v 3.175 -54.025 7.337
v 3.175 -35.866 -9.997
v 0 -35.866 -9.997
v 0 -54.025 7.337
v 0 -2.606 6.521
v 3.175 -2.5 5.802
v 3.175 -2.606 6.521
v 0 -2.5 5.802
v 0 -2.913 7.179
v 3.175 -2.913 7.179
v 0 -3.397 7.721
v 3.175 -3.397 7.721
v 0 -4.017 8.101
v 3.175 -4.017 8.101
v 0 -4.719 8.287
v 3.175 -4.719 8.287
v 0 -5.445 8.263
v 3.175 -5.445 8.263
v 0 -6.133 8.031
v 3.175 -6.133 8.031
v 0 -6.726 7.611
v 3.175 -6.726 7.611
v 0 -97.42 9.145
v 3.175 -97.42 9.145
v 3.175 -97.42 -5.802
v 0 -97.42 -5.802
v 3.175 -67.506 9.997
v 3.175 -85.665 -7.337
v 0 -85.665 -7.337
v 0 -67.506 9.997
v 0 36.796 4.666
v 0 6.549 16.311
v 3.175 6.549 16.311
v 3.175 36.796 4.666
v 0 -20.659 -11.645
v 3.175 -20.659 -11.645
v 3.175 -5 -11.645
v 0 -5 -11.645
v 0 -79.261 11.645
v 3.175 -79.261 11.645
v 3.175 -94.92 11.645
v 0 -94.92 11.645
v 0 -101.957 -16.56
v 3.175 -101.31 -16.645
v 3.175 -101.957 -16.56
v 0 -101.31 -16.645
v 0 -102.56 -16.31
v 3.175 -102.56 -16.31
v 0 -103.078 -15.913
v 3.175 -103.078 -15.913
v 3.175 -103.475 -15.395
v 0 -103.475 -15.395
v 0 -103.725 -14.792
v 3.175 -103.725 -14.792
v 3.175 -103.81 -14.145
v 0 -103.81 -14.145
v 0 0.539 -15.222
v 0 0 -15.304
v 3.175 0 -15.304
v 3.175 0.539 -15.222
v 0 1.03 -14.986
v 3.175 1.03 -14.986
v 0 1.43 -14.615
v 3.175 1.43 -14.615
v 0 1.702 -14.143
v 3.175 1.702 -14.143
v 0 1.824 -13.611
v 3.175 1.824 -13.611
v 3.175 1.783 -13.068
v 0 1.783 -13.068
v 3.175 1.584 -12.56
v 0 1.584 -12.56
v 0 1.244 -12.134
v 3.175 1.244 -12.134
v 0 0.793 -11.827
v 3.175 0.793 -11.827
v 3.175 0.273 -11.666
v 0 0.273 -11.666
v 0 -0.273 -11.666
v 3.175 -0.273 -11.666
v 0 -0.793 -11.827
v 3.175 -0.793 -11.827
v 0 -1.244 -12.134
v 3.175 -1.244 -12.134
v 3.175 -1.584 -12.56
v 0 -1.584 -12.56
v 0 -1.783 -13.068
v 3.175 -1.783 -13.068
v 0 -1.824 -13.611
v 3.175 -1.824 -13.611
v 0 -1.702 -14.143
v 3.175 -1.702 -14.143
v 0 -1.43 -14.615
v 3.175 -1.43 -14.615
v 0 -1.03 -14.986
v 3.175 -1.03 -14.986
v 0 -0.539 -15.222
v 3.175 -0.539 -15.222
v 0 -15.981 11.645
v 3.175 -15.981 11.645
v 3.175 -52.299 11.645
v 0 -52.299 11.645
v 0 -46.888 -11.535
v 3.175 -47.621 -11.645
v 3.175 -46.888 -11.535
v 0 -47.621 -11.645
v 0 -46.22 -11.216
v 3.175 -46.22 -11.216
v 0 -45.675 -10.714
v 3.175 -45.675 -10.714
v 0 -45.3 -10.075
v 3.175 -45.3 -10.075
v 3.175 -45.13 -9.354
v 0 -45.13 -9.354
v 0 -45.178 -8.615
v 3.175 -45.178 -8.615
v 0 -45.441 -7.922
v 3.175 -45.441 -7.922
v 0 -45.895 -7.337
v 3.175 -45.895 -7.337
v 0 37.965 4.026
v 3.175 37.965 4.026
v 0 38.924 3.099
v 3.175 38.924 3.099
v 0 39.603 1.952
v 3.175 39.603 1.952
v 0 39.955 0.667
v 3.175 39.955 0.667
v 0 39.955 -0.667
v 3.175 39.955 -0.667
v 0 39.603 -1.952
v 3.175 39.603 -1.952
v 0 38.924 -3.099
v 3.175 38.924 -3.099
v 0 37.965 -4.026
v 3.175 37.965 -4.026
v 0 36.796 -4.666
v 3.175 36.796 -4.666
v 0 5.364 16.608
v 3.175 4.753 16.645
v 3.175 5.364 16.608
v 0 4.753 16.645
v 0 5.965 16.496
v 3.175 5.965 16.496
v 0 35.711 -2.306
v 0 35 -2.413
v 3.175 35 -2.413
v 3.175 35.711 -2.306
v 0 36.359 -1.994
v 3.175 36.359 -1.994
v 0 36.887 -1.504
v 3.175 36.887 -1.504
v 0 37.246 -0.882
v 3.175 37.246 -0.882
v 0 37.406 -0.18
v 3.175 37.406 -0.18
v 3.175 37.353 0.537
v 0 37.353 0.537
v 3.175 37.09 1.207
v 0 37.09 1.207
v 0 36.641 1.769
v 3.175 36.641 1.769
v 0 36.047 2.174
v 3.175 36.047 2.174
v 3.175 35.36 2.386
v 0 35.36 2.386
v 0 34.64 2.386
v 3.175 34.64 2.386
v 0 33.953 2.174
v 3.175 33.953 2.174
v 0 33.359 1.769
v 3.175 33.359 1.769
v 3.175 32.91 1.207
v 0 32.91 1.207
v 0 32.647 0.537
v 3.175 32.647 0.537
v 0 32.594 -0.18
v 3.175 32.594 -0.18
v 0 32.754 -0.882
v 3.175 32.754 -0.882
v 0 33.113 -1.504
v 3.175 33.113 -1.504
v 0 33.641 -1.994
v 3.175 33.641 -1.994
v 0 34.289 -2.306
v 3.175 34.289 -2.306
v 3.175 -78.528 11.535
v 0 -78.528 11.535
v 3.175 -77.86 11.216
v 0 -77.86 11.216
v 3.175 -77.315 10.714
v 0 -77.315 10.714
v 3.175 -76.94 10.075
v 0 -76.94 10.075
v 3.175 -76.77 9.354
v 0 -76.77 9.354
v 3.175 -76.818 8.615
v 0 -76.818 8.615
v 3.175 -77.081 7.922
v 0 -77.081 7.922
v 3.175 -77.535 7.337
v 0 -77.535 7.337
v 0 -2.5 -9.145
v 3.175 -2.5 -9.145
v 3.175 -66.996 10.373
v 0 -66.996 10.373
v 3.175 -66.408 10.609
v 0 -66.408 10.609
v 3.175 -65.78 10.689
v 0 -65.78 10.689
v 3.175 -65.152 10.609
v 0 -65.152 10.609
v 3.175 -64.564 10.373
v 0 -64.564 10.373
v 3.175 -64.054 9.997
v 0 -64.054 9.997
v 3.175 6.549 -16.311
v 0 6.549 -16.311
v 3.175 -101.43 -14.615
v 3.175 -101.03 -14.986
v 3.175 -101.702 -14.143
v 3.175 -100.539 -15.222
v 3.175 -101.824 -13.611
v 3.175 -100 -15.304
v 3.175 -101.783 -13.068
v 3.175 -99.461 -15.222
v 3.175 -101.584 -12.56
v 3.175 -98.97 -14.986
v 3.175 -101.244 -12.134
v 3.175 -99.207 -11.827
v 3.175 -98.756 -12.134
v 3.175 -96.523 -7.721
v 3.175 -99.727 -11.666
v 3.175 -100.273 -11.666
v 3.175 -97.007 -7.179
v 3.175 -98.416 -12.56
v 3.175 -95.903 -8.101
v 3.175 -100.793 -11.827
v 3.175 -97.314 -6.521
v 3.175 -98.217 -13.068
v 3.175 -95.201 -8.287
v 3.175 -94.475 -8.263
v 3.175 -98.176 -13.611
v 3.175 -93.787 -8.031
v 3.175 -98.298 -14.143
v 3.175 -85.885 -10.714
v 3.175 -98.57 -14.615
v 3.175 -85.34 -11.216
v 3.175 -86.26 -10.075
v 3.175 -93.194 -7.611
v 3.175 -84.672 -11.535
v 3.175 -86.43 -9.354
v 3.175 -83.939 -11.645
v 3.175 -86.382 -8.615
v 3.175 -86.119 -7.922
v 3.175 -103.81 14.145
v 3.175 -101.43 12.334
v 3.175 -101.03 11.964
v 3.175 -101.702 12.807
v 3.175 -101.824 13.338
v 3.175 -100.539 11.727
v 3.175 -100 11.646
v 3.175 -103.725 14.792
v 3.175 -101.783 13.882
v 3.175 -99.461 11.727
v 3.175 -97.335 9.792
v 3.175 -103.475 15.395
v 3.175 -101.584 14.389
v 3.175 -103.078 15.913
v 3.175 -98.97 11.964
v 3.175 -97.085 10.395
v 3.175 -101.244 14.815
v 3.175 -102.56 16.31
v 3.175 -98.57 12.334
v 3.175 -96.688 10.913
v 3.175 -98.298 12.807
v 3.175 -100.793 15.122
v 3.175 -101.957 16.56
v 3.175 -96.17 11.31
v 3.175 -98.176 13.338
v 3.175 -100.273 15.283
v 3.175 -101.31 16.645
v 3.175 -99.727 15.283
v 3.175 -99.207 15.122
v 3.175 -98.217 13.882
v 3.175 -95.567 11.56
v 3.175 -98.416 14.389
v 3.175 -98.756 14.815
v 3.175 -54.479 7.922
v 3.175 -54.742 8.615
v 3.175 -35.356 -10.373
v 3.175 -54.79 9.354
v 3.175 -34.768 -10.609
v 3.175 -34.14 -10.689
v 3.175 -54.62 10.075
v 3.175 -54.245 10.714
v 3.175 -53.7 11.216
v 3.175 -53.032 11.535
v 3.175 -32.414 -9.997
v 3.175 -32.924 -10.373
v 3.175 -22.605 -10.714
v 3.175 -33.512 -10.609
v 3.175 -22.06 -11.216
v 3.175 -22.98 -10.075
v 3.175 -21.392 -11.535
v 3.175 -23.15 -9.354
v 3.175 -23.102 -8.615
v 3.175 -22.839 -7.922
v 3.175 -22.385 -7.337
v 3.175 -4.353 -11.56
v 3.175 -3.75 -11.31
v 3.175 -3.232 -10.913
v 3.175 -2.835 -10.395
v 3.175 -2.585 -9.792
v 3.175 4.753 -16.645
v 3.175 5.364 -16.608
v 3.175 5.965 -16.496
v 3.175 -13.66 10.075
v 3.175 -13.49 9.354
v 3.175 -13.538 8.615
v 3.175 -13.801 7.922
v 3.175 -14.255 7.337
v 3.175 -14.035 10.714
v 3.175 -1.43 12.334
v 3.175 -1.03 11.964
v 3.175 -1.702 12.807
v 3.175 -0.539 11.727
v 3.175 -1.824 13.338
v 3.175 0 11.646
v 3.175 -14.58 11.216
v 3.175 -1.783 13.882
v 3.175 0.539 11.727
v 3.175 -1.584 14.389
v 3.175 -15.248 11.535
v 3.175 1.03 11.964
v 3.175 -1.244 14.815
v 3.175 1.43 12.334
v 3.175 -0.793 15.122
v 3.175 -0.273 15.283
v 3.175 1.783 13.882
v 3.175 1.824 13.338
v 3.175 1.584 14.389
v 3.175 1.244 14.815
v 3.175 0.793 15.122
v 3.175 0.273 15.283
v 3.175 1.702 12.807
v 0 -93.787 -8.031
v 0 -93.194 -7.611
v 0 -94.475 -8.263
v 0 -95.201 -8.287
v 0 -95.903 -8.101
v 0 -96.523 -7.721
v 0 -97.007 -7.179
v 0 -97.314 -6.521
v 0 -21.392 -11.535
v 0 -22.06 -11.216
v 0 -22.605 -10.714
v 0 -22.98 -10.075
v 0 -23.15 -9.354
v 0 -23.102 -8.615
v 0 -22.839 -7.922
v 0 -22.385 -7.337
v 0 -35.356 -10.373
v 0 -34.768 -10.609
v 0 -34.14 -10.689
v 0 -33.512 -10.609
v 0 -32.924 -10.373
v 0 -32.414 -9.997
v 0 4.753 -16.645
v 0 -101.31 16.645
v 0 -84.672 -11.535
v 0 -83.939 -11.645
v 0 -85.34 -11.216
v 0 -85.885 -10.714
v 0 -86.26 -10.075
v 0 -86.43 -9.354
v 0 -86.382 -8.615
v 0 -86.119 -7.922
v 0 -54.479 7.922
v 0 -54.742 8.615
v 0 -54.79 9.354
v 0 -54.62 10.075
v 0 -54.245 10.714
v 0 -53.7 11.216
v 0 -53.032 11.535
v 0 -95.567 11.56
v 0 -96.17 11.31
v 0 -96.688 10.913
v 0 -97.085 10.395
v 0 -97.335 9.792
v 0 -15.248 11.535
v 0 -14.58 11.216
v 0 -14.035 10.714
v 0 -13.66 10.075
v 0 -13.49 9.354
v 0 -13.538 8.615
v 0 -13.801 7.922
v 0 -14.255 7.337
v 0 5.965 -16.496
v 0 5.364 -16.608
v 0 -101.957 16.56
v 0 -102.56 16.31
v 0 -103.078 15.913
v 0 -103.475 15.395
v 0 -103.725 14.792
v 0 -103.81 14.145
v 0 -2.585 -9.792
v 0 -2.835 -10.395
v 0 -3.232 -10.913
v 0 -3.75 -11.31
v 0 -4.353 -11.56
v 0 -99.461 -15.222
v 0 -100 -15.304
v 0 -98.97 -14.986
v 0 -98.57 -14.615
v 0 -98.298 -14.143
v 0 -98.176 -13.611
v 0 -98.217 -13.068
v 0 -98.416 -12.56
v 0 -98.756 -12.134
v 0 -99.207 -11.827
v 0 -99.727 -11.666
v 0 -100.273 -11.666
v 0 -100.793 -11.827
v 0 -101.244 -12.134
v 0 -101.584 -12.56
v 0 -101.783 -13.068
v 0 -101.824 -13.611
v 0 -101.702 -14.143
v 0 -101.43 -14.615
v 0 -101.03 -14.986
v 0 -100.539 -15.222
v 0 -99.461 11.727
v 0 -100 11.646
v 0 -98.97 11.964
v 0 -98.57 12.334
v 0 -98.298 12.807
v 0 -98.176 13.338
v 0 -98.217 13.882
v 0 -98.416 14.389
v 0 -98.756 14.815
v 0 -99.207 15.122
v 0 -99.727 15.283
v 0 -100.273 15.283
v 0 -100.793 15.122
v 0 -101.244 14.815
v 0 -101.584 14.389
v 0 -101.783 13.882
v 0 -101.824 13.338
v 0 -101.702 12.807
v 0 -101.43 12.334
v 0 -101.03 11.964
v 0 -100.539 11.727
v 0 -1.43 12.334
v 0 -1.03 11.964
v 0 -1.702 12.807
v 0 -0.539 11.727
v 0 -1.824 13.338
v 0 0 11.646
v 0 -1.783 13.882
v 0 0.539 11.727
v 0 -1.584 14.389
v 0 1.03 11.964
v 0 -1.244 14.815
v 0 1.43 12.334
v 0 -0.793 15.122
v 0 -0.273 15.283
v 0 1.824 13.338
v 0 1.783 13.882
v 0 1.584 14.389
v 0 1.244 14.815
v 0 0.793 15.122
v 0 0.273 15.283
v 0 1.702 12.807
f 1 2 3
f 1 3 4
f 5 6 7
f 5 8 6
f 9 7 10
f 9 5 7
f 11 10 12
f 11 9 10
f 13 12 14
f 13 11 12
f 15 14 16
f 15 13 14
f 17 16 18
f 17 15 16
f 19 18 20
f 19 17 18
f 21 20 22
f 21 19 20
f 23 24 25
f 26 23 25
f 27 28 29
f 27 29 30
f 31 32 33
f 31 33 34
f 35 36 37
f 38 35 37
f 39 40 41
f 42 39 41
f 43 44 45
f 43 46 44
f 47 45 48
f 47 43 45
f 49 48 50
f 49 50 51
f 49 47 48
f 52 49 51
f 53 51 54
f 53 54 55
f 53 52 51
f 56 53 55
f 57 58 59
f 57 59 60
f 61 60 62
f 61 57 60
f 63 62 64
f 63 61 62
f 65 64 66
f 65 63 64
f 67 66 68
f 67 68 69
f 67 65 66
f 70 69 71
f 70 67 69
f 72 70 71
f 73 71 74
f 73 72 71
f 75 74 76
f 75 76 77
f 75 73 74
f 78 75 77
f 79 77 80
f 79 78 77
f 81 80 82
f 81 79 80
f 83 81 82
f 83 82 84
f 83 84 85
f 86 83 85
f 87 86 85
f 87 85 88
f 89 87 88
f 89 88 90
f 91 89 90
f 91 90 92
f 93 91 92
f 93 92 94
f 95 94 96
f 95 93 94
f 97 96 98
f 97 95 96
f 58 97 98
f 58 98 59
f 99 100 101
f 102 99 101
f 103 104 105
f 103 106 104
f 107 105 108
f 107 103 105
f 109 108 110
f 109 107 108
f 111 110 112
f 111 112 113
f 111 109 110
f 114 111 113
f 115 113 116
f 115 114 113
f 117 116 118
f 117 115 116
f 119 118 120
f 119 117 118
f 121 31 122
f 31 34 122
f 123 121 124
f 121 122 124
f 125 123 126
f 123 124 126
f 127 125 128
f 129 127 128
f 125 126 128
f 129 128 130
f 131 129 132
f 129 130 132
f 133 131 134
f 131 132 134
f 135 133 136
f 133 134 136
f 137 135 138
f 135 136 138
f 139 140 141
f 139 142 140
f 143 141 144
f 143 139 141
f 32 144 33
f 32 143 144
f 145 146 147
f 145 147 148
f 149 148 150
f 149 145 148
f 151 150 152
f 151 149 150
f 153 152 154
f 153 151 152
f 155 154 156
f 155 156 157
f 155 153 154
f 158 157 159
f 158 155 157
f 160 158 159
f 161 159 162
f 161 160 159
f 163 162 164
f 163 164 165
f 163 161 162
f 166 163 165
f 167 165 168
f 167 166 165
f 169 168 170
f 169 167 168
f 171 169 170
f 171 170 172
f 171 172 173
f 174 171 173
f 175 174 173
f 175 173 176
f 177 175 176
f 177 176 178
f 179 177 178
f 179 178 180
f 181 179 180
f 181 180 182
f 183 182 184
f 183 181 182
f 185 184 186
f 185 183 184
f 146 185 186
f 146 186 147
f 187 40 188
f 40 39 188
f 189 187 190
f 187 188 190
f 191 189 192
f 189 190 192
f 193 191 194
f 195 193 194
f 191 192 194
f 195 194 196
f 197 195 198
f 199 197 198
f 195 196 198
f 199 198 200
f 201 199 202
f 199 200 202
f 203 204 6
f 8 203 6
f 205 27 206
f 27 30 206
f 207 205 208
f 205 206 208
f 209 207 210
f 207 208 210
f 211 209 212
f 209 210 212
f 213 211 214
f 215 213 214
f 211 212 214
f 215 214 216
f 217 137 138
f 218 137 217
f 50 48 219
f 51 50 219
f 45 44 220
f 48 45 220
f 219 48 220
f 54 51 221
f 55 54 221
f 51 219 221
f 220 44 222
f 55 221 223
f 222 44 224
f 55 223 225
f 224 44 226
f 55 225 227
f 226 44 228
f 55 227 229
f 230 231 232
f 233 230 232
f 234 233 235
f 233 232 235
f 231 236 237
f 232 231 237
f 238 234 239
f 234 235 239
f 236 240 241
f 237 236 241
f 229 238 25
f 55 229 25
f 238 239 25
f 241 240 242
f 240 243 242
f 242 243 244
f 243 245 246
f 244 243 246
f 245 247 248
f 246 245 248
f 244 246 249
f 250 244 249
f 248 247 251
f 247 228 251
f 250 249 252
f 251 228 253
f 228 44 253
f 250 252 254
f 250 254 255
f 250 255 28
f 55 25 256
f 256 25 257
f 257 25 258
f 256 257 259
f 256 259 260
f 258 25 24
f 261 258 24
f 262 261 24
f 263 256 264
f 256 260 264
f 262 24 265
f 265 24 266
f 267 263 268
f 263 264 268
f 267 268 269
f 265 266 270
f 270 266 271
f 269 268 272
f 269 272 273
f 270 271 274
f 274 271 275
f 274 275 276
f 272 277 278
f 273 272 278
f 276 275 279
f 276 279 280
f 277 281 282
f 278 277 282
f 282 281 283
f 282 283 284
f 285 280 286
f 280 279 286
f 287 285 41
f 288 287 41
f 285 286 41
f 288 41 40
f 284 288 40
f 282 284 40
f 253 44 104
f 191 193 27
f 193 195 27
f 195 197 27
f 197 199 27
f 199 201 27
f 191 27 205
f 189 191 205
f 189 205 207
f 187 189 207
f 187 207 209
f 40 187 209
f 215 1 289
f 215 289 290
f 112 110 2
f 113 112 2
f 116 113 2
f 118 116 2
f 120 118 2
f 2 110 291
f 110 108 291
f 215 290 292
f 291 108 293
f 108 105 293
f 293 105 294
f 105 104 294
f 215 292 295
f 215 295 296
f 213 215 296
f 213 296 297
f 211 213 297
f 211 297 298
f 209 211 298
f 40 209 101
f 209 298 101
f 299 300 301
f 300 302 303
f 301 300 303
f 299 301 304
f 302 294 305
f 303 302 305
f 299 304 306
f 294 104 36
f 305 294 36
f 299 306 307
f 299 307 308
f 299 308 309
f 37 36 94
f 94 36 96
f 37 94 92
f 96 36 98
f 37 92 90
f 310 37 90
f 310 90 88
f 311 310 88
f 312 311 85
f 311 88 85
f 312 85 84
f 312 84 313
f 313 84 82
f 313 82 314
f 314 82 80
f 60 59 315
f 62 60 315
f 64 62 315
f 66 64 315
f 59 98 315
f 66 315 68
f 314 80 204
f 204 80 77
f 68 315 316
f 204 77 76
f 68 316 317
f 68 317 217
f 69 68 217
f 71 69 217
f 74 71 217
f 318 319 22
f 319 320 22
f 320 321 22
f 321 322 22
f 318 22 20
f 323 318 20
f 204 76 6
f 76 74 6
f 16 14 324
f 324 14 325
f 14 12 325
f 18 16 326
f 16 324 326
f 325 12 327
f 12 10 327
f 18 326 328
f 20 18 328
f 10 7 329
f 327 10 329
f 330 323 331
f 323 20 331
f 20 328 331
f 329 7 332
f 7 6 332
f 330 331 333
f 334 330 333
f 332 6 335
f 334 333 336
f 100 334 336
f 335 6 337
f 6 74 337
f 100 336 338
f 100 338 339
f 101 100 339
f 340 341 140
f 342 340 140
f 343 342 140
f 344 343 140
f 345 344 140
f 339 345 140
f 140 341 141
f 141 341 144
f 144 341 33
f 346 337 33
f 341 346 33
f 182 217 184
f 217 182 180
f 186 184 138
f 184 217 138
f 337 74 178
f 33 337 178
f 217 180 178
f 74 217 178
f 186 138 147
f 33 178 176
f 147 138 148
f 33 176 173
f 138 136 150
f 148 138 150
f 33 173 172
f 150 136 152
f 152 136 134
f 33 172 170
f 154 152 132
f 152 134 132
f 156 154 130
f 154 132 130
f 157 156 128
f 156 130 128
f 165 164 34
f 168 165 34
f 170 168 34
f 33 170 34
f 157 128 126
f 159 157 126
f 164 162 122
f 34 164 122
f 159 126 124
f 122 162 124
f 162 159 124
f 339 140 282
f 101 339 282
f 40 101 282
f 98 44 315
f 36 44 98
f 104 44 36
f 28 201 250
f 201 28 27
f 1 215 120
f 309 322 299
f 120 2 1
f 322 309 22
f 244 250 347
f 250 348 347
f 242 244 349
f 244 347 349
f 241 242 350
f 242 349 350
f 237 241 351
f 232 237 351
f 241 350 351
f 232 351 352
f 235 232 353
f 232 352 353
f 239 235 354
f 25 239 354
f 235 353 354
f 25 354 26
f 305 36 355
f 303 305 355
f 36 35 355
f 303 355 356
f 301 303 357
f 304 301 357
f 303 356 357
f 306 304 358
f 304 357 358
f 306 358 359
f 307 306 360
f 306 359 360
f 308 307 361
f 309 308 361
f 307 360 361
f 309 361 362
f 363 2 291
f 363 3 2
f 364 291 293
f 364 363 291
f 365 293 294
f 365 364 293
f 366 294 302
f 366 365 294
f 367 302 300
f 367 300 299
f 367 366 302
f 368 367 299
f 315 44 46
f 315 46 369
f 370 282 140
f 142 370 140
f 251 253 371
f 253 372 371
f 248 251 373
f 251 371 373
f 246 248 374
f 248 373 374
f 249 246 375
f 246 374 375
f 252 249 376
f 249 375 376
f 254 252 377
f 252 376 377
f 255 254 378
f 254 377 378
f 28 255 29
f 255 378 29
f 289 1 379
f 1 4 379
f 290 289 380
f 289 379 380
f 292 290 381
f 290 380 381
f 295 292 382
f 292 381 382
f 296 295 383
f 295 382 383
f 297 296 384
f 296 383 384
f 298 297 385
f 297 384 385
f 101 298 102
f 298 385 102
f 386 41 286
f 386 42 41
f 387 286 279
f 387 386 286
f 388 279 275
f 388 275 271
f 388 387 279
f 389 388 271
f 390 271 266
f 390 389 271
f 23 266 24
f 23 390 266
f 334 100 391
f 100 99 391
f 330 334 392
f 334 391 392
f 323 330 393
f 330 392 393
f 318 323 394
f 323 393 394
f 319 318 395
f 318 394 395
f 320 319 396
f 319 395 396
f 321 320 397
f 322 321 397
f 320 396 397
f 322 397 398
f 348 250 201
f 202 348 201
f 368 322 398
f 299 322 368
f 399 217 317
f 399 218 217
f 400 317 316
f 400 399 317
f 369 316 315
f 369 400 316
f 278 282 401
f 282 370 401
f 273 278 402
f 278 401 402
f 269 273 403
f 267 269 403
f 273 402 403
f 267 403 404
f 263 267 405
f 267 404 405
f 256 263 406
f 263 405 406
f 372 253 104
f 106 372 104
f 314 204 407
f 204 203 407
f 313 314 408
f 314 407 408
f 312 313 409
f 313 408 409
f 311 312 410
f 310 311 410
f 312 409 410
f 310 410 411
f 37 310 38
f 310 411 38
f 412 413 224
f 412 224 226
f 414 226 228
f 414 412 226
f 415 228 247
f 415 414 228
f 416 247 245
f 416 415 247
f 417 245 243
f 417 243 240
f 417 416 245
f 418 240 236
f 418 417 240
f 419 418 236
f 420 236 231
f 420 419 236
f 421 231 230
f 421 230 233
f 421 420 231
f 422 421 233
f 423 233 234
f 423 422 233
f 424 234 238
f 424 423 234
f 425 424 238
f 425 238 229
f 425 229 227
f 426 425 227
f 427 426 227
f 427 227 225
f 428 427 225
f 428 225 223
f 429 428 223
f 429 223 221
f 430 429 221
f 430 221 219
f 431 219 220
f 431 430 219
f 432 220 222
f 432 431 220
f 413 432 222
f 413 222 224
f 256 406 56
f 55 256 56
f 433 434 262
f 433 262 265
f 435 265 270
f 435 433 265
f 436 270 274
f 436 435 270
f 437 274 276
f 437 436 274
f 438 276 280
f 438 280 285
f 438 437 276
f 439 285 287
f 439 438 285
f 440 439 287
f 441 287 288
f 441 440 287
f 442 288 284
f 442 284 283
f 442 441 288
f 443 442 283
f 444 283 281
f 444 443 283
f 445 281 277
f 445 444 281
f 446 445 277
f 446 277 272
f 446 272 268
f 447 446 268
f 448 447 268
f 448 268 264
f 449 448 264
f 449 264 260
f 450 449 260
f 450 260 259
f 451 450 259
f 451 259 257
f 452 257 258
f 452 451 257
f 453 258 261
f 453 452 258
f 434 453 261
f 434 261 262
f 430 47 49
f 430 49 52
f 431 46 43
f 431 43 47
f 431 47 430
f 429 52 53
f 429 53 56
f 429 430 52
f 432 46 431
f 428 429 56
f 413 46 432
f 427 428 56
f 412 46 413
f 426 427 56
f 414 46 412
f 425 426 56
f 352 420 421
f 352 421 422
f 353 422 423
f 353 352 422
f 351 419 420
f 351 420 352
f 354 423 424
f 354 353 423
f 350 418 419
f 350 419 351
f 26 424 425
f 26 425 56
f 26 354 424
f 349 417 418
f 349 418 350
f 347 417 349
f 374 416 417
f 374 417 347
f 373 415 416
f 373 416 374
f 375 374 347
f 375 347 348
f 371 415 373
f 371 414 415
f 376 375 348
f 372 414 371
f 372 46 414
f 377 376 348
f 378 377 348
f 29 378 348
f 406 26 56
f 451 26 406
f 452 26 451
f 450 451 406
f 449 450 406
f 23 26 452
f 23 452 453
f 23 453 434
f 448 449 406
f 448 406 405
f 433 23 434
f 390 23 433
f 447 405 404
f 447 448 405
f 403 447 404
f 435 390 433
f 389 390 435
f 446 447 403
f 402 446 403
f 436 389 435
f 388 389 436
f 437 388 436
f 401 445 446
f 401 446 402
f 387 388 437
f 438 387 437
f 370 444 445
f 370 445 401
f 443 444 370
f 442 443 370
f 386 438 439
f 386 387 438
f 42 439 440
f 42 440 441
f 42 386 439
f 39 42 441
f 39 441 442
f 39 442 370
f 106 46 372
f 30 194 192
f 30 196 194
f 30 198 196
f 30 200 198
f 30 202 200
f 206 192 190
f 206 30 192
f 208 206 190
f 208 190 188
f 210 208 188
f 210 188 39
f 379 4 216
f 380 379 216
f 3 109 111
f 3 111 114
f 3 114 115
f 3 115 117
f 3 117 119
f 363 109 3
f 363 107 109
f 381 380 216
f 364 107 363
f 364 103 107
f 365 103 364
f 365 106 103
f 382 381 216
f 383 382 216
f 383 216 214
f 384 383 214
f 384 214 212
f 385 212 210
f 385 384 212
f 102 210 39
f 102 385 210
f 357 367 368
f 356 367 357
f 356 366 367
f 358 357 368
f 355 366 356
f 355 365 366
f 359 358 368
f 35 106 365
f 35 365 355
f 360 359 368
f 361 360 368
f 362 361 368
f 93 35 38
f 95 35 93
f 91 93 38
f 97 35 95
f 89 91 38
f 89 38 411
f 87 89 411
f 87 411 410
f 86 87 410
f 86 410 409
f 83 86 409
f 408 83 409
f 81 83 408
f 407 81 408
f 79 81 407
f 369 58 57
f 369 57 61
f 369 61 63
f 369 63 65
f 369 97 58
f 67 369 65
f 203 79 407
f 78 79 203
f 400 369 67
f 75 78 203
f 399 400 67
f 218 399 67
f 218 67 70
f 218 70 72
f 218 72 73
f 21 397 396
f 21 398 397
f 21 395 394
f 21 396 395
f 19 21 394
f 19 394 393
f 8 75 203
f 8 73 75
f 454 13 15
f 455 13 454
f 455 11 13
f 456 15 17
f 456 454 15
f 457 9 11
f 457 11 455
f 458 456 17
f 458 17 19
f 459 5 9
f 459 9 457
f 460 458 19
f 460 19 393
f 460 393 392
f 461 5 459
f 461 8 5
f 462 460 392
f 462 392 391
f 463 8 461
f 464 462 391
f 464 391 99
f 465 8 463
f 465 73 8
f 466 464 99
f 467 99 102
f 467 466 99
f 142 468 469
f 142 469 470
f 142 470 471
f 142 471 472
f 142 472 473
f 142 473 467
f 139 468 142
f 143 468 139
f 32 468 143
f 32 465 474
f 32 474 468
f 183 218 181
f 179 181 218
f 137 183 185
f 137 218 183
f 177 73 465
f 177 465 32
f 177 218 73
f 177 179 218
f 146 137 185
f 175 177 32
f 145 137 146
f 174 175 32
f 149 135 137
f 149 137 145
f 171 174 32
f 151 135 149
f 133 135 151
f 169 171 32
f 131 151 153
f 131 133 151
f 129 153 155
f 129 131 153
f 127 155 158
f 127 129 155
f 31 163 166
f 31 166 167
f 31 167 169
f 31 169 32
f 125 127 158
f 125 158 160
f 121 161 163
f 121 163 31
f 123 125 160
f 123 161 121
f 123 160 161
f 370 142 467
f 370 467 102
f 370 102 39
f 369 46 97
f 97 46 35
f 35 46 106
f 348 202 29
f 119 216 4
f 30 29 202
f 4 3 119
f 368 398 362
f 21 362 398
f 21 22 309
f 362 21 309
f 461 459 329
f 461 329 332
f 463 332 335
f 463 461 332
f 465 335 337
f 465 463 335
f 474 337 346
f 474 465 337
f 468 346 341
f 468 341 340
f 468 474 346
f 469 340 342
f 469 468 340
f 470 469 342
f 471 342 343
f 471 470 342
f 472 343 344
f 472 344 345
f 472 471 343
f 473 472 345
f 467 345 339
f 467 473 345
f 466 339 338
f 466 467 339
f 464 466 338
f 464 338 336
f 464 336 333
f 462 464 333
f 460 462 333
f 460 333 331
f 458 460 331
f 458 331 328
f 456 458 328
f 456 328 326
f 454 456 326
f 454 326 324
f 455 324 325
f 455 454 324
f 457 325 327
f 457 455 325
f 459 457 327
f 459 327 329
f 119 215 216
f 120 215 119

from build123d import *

# Parameters (mm, degrees)
SKETCH1_W           = 41.514809608
SKETCH1_H           = 98.81
SKETCH1_R           = 1.8288
SKETCH1_R_2         = 2.413
BOSS_EXTRUDE1_DEPTH = 3.175
SKETCH2_W           = 4.112404804
SKETCH2_H           = 141.223
CUT_EXTRUDE1_DEPTH  = 106.912542124
FILLET1_R           = 2.5
FILLET2_R           = 5


with BuildPart() as part:
    # Sketch1 → Boss-Extrude1 (new body)
    # profile 1 of 2: a face of its own
    with BuildSketch(Plane(origin=(0, 0, 0), x_dir=(0, 0, -1), z_dir=(1, 0, 0))):
        with Locations((0, -54.405)):
            Rectangle(SKETCH1_W, SKETCH1_H)
        with Locations((13.4747, -100)):
            Circle(SKETCH1_R, mode=Mode.SUBTRACT)
        with Locations((-13.4747, -100)):
            Circle(SKETCH1_R, mode=Mode.SUBTRACT)
    # profile 2 of 2: a face of its own
    with BuildSketch(Plane(origin=(0, 0, 0), x_dir=(0, 0, -1), z_dir=(1, 0, 0))):
        Polygon((0, 48.916537522), (20.757404804, -5), (-20.757404804, -5), align=None)
        with Locations((13.4747, 0)):
            Circle(SKETCH1_R, mode=Mode.SUBTRACT)
        with Locations((0, 35)):
            Circle(SKETCH1_R_2, mode=Mode.SUBTRACT)
        with Locations((-13.4747, 0)):
            Circle(SKETCH1_R, mode=Mode.SUBTRACT)
    extrude(amount=BOSS_EXTRUDE1_DEPTH)

    # Sketch2 → Cut-Extrude1 (cut, through all)
    with BuildSketch(Plane(origin=(3.175, 0, 0), x_dir=(0, 0, -1), z_dir=(1, 0, 0))):
        Polygon((11.645, -2.5), (-11.645, -2.5), (11.645, -26.898674048), align=None)
        Polygon((-11.645, -9.741325952), (11.645, -34.14), (-11.645, -58.538674048), (-11.645, -34.14), align=None)
        Polygon((-11.645, -73.021325952), (-11.645, -97.42), (11.645, -97.42), align=None)
        Polygon((11.645, -41.381325952), (11.645, -65.78), (11.645, -90.178674048), (-11.645, -65.78), align=None)
        with Locations((-18.701202402, -33.1985)):
            Rectangle(SKETCH2_W, SKETCH2_H)
        with Locations((18.701202402, -33.1985)):
            Rectangle(SKETCH2_W, SKETCH2_H)
    extrude(amount=-CUT_EXTRUDE1_DEPTH, mode=Mode.SUBTRACT)

    # Fillet1
    fillet1_edges = [part.edges().sort_by_distance(p)[0] for p in [
        (1.5875, -103.81, -16.645),
        (1.5875, -9.741325952, 11.645),
        (1.5875, -34.14, -11.645),
        (1.5875, -58.538674048, 11.645),
        (1.5875, -26.898674048, -11.645),
        (1.5875, -2.5, 11.645),
        (1.5875, -2.5, -11.645),
        (1.5875, -90.178674048, -11.645),
        (1.5875, -65.78, 11.645),
        (1.5875, -41.381325952, -11.645),
        (1.5875, -103.81, 16.645),
        (1.5875, -73.021325952, 11.645),
        (1.5875, -97.42, -11.645),
        (1.5875, -97.42, 11.645),
    ]]
    fillet(fillet1_edges, radius=FILLET1_R)

    # Fillet2
    fillet2_edges = [part.edges().sort_by_distance(p)[0] for p in [
        (1.5875, 48.916537522, 0),
        (1.5875, 5.681808734, -16.645),
        (1.5875, 5.681808734, 16.645),
    ]]
    fillet(fillet2_edges, radius=FILLET2_R)


solid = part.part
